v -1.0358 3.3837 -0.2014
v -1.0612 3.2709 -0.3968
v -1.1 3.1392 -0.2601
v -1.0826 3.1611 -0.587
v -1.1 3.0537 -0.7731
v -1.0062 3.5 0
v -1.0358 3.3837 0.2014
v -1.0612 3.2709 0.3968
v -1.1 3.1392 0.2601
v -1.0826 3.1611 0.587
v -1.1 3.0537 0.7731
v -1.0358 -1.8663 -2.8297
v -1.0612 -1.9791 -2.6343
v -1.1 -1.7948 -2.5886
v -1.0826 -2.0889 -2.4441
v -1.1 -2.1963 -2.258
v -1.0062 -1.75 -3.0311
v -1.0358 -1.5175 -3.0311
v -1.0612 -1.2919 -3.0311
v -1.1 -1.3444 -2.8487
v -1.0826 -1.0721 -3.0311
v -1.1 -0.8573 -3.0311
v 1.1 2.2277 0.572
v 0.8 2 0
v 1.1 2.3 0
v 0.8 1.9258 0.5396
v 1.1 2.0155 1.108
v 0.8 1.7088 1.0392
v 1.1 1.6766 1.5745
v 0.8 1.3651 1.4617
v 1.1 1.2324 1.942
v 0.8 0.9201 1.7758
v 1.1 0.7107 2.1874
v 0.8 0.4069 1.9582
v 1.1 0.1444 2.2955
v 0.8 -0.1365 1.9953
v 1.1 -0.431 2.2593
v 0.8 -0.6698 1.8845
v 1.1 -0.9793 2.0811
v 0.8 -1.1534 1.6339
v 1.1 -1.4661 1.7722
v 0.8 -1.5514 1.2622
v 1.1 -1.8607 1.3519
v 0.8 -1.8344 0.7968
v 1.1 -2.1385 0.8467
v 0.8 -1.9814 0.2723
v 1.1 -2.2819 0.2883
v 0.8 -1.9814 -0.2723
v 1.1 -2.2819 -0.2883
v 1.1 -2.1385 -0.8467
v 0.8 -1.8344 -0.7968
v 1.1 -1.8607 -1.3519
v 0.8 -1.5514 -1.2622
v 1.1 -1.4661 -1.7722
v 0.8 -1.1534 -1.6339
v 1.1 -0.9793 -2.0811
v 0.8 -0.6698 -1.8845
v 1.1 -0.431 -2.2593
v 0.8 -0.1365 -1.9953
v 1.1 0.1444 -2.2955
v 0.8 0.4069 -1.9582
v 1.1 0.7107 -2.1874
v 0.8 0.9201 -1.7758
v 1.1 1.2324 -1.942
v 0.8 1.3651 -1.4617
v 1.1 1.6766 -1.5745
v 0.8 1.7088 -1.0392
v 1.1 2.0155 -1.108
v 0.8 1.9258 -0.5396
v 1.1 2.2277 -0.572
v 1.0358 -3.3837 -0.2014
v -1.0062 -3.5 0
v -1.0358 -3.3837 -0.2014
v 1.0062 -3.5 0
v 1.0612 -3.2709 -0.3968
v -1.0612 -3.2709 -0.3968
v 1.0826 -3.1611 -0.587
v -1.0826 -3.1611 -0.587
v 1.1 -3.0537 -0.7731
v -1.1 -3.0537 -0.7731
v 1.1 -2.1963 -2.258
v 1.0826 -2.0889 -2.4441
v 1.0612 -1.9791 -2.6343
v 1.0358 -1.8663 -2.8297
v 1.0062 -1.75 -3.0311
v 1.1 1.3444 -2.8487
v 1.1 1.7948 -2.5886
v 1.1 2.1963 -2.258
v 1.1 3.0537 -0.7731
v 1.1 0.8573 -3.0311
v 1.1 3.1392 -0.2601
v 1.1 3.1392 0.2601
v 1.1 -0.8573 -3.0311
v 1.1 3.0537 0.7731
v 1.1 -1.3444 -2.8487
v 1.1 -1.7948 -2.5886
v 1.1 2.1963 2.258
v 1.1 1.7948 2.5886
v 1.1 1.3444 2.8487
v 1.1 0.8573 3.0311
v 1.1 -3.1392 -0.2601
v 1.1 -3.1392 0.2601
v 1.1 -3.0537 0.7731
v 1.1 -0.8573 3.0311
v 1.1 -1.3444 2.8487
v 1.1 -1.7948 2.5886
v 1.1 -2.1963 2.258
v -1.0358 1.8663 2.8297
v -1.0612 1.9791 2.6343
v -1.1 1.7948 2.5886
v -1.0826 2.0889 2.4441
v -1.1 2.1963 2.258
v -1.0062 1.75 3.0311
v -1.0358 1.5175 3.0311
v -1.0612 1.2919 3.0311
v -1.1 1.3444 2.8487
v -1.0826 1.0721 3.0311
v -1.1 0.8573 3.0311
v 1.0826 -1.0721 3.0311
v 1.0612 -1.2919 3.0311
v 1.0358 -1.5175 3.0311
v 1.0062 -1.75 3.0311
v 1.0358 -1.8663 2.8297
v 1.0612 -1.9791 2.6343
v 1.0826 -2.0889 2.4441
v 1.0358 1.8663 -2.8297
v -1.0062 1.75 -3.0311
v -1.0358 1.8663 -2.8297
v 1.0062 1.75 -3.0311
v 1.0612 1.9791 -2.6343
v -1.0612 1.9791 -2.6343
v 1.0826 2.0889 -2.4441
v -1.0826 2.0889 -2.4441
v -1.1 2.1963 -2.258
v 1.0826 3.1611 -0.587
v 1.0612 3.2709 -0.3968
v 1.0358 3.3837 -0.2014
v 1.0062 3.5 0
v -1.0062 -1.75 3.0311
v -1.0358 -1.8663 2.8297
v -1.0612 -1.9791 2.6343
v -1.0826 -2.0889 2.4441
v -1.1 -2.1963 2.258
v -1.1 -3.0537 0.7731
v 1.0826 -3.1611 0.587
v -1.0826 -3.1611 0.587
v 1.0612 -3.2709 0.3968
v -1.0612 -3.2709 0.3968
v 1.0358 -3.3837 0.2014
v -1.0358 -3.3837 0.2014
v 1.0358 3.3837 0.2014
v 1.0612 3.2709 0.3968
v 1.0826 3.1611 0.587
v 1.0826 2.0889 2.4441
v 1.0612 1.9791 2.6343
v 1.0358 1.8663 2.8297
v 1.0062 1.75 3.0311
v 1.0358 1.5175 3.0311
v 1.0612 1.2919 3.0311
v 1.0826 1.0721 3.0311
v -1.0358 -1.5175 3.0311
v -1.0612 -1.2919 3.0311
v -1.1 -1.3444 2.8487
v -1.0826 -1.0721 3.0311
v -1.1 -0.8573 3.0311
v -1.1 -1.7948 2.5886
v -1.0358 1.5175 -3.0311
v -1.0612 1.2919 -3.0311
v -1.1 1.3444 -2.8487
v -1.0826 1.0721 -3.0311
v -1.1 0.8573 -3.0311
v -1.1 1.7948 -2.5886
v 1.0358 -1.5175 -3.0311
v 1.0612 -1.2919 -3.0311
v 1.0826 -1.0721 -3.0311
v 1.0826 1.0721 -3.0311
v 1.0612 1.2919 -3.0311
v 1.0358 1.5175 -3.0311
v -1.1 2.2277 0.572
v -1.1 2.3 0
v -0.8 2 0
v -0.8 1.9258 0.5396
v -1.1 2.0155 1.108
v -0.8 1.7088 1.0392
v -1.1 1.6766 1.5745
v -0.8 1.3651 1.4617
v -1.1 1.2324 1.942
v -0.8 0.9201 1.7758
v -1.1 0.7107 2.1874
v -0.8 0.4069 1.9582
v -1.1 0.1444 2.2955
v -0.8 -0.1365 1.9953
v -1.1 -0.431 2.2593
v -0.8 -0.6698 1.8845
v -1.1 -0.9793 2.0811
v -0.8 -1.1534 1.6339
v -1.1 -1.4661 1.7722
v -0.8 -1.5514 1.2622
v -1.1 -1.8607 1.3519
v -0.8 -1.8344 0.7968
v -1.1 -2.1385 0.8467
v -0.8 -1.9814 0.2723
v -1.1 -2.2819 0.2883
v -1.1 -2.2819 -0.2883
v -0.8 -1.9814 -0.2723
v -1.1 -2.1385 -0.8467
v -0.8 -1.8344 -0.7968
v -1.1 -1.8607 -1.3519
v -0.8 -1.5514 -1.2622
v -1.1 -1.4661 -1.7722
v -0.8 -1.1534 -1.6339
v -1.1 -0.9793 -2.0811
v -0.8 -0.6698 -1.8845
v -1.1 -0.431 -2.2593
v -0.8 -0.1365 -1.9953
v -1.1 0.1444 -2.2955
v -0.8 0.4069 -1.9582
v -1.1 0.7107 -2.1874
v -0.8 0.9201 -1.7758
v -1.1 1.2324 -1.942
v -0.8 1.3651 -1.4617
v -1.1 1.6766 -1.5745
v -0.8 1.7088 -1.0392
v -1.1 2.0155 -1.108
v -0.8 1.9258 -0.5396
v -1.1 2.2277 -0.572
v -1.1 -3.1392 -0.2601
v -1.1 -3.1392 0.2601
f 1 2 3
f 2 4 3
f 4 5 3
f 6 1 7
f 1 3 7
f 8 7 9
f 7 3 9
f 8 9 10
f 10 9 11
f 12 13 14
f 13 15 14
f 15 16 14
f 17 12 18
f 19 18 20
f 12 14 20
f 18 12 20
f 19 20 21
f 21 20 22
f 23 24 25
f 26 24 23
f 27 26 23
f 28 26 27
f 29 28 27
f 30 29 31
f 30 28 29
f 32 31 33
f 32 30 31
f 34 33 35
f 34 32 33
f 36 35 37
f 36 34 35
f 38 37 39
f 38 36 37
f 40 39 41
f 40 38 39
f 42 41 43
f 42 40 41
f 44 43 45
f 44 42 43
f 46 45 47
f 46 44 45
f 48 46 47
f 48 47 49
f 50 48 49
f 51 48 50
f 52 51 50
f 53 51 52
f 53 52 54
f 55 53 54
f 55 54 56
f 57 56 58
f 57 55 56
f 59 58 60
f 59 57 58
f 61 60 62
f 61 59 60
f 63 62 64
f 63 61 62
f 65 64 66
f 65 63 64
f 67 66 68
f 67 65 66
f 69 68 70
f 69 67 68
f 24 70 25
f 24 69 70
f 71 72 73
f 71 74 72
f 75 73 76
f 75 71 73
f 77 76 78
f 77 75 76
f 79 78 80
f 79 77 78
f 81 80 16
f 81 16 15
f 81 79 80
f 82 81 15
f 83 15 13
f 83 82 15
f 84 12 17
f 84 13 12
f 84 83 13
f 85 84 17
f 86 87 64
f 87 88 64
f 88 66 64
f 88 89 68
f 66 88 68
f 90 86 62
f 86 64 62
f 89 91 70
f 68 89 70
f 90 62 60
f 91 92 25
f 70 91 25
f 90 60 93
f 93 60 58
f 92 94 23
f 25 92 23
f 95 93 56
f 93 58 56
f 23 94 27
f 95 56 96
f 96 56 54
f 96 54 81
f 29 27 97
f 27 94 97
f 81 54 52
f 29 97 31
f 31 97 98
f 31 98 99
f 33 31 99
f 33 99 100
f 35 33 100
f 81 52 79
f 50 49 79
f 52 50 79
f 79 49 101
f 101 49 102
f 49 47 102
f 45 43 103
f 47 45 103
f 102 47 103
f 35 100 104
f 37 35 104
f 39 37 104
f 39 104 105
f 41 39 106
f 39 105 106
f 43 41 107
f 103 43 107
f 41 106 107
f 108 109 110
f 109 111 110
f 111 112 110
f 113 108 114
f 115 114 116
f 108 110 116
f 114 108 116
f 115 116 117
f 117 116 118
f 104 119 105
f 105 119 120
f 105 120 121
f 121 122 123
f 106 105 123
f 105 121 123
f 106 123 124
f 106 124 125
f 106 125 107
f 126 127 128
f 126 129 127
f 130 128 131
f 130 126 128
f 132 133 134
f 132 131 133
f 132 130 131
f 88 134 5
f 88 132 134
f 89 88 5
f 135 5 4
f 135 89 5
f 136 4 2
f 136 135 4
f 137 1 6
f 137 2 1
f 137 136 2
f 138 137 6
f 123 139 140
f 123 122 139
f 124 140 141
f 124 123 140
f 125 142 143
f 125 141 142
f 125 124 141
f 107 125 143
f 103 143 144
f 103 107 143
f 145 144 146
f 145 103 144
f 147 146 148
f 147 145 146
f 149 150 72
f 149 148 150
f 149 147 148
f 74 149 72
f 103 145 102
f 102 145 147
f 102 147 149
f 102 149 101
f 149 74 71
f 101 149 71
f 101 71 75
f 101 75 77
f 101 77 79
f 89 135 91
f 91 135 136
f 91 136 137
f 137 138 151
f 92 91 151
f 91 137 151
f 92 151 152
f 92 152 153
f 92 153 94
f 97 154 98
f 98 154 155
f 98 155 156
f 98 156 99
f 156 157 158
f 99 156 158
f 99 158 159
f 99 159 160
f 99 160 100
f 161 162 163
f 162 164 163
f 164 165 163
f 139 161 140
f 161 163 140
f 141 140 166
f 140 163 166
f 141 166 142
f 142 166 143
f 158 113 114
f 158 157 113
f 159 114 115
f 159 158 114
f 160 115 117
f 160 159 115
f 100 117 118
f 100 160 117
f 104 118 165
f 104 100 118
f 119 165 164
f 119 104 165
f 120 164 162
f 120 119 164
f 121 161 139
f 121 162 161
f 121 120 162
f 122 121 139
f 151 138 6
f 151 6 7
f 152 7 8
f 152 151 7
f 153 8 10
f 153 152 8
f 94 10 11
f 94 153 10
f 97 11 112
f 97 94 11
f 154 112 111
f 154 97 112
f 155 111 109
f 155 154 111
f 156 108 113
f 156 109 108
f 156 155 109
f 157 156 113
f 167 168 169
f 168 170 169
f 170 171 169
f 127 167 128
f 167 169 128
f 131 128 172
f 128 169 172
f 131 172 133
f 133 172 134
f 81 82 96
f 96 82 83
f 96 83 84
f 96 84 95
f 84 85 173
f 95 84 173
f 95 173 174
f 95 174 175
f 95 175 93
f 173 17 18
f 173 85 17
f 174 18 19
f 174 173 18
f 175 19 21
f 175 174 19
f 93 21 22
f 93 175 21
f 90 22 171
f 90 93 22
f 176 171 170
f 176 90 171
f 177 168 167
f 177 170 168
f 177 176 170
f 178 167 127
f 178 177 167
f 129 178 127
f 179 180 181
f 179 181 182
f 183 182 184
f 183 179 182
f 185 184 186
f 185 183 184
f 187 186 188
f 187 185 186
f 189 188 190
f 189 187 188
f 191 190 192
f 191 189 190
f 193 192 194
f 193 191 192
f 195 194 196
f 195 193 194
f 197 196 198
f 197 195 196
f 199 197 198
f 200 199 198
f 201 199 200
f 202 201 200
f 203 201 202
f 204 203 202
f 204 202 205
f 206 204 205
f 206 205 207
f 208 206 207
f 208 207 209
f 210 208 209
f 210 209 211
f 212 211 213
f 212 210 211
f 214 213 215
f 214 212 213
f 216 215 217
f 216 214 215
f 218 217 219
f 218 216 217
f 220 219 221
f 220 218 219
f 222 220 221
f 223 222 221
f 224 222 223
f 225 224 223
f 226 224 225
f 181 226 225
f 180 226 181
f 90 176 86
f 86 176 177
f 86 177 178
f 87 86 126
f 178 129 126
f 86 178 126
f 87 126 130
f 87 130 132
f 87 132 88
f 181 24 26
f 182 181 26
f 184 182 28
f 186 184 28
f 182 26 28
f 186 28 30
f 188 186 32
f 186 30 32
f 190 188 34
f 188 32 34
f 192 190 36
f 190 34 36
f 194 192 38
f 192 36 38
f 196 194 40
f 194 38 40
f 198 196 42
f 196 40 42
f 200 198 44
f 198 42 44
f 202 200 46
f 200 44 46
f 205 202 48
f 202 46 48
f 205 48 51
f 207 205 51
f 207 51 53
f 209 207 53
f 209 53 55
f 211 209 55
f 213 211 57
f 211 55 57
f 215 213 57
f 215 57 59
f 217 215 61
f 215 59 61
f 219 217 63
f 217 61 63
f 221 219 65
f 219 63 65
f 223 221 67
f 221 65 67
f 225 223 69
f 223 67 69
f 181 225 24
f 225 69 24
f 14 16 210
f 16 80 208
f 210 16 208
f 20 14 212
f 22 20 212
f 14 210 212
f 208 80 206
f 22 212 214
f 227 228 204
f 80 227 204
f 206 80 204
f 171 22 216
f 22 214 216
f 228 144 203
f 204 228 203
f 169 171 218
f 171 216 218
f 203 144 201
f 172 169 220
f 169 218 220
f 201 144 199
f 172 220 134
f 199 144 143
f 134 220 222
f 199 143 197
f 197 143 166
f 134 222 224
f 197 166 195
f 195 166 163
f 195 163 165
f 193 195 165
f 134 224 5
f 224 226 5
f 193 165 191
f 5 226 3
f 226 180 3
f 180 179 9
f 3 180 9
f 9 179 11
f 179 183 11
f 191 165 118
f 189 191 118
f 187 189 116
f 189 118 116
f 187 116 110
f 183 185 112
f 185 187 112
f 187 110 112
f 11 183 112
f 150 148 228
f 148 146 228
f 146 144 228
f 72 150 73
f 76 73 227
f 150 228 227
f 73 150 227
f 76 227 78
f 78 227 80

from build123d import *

# Parameters (mm, degrees)
SKETCH_5_OUTSIDE_W  = 11.028
SKETCH_5_OUTSIDE_H  = 11.028
CUT_EXTRUDE_6_DEPTH = 1.1
CHAMFER_4_SIZE      = 0.3


with BuildPart() as part:
    # Эскиз3 → Повернуть1 (revolve)
    with BuildSketch(Plane.XY):
        Polygon((1.1, 2), (1.1, 3.15), (1.006217783, 3.5), (-1.006217783, 3.5), (-1.1, 3.15), (-1.1, 2), align=None)
    revolve(axis=Axis((-2.78527838, 0, 0), (1, 0, 0)))

    # Эскиз5 outside → Вырез-Вытянуть6 (cut, symmetric)
    with BuildSketch(Plane(origin=(0, 0, 0), x_dir=(0, 0, -1), z_dir=(1, 0, 0))):
        Rectangle(SKETCH_5_OUTSIDE_W, SKETCH_5_OUTSIDE_H)
        Polygon((0, 3.5), (-3.031088913, 1.75), (-3.031088913, -1.75), (0, -3.5), (3.031088913, -1.75), (3.031088913, 1.75), align=None, mode=Mode.SUBTRACT)
    extrude(amount=CUT_EXTRUDE_6_DEPTH, both=True, mode=Mode.SUBTRACT)

    # Фаска4
    chamfer_4_edges = [part.edges().sort_by_distance(p)[0] for p in [
        (-1.1, -2, 0),
        (1.1, -2, 0),
    ]]
    chamfer(chamfer_4_edges, length=CHAMFER_4_SIZE)


solid = part.part
